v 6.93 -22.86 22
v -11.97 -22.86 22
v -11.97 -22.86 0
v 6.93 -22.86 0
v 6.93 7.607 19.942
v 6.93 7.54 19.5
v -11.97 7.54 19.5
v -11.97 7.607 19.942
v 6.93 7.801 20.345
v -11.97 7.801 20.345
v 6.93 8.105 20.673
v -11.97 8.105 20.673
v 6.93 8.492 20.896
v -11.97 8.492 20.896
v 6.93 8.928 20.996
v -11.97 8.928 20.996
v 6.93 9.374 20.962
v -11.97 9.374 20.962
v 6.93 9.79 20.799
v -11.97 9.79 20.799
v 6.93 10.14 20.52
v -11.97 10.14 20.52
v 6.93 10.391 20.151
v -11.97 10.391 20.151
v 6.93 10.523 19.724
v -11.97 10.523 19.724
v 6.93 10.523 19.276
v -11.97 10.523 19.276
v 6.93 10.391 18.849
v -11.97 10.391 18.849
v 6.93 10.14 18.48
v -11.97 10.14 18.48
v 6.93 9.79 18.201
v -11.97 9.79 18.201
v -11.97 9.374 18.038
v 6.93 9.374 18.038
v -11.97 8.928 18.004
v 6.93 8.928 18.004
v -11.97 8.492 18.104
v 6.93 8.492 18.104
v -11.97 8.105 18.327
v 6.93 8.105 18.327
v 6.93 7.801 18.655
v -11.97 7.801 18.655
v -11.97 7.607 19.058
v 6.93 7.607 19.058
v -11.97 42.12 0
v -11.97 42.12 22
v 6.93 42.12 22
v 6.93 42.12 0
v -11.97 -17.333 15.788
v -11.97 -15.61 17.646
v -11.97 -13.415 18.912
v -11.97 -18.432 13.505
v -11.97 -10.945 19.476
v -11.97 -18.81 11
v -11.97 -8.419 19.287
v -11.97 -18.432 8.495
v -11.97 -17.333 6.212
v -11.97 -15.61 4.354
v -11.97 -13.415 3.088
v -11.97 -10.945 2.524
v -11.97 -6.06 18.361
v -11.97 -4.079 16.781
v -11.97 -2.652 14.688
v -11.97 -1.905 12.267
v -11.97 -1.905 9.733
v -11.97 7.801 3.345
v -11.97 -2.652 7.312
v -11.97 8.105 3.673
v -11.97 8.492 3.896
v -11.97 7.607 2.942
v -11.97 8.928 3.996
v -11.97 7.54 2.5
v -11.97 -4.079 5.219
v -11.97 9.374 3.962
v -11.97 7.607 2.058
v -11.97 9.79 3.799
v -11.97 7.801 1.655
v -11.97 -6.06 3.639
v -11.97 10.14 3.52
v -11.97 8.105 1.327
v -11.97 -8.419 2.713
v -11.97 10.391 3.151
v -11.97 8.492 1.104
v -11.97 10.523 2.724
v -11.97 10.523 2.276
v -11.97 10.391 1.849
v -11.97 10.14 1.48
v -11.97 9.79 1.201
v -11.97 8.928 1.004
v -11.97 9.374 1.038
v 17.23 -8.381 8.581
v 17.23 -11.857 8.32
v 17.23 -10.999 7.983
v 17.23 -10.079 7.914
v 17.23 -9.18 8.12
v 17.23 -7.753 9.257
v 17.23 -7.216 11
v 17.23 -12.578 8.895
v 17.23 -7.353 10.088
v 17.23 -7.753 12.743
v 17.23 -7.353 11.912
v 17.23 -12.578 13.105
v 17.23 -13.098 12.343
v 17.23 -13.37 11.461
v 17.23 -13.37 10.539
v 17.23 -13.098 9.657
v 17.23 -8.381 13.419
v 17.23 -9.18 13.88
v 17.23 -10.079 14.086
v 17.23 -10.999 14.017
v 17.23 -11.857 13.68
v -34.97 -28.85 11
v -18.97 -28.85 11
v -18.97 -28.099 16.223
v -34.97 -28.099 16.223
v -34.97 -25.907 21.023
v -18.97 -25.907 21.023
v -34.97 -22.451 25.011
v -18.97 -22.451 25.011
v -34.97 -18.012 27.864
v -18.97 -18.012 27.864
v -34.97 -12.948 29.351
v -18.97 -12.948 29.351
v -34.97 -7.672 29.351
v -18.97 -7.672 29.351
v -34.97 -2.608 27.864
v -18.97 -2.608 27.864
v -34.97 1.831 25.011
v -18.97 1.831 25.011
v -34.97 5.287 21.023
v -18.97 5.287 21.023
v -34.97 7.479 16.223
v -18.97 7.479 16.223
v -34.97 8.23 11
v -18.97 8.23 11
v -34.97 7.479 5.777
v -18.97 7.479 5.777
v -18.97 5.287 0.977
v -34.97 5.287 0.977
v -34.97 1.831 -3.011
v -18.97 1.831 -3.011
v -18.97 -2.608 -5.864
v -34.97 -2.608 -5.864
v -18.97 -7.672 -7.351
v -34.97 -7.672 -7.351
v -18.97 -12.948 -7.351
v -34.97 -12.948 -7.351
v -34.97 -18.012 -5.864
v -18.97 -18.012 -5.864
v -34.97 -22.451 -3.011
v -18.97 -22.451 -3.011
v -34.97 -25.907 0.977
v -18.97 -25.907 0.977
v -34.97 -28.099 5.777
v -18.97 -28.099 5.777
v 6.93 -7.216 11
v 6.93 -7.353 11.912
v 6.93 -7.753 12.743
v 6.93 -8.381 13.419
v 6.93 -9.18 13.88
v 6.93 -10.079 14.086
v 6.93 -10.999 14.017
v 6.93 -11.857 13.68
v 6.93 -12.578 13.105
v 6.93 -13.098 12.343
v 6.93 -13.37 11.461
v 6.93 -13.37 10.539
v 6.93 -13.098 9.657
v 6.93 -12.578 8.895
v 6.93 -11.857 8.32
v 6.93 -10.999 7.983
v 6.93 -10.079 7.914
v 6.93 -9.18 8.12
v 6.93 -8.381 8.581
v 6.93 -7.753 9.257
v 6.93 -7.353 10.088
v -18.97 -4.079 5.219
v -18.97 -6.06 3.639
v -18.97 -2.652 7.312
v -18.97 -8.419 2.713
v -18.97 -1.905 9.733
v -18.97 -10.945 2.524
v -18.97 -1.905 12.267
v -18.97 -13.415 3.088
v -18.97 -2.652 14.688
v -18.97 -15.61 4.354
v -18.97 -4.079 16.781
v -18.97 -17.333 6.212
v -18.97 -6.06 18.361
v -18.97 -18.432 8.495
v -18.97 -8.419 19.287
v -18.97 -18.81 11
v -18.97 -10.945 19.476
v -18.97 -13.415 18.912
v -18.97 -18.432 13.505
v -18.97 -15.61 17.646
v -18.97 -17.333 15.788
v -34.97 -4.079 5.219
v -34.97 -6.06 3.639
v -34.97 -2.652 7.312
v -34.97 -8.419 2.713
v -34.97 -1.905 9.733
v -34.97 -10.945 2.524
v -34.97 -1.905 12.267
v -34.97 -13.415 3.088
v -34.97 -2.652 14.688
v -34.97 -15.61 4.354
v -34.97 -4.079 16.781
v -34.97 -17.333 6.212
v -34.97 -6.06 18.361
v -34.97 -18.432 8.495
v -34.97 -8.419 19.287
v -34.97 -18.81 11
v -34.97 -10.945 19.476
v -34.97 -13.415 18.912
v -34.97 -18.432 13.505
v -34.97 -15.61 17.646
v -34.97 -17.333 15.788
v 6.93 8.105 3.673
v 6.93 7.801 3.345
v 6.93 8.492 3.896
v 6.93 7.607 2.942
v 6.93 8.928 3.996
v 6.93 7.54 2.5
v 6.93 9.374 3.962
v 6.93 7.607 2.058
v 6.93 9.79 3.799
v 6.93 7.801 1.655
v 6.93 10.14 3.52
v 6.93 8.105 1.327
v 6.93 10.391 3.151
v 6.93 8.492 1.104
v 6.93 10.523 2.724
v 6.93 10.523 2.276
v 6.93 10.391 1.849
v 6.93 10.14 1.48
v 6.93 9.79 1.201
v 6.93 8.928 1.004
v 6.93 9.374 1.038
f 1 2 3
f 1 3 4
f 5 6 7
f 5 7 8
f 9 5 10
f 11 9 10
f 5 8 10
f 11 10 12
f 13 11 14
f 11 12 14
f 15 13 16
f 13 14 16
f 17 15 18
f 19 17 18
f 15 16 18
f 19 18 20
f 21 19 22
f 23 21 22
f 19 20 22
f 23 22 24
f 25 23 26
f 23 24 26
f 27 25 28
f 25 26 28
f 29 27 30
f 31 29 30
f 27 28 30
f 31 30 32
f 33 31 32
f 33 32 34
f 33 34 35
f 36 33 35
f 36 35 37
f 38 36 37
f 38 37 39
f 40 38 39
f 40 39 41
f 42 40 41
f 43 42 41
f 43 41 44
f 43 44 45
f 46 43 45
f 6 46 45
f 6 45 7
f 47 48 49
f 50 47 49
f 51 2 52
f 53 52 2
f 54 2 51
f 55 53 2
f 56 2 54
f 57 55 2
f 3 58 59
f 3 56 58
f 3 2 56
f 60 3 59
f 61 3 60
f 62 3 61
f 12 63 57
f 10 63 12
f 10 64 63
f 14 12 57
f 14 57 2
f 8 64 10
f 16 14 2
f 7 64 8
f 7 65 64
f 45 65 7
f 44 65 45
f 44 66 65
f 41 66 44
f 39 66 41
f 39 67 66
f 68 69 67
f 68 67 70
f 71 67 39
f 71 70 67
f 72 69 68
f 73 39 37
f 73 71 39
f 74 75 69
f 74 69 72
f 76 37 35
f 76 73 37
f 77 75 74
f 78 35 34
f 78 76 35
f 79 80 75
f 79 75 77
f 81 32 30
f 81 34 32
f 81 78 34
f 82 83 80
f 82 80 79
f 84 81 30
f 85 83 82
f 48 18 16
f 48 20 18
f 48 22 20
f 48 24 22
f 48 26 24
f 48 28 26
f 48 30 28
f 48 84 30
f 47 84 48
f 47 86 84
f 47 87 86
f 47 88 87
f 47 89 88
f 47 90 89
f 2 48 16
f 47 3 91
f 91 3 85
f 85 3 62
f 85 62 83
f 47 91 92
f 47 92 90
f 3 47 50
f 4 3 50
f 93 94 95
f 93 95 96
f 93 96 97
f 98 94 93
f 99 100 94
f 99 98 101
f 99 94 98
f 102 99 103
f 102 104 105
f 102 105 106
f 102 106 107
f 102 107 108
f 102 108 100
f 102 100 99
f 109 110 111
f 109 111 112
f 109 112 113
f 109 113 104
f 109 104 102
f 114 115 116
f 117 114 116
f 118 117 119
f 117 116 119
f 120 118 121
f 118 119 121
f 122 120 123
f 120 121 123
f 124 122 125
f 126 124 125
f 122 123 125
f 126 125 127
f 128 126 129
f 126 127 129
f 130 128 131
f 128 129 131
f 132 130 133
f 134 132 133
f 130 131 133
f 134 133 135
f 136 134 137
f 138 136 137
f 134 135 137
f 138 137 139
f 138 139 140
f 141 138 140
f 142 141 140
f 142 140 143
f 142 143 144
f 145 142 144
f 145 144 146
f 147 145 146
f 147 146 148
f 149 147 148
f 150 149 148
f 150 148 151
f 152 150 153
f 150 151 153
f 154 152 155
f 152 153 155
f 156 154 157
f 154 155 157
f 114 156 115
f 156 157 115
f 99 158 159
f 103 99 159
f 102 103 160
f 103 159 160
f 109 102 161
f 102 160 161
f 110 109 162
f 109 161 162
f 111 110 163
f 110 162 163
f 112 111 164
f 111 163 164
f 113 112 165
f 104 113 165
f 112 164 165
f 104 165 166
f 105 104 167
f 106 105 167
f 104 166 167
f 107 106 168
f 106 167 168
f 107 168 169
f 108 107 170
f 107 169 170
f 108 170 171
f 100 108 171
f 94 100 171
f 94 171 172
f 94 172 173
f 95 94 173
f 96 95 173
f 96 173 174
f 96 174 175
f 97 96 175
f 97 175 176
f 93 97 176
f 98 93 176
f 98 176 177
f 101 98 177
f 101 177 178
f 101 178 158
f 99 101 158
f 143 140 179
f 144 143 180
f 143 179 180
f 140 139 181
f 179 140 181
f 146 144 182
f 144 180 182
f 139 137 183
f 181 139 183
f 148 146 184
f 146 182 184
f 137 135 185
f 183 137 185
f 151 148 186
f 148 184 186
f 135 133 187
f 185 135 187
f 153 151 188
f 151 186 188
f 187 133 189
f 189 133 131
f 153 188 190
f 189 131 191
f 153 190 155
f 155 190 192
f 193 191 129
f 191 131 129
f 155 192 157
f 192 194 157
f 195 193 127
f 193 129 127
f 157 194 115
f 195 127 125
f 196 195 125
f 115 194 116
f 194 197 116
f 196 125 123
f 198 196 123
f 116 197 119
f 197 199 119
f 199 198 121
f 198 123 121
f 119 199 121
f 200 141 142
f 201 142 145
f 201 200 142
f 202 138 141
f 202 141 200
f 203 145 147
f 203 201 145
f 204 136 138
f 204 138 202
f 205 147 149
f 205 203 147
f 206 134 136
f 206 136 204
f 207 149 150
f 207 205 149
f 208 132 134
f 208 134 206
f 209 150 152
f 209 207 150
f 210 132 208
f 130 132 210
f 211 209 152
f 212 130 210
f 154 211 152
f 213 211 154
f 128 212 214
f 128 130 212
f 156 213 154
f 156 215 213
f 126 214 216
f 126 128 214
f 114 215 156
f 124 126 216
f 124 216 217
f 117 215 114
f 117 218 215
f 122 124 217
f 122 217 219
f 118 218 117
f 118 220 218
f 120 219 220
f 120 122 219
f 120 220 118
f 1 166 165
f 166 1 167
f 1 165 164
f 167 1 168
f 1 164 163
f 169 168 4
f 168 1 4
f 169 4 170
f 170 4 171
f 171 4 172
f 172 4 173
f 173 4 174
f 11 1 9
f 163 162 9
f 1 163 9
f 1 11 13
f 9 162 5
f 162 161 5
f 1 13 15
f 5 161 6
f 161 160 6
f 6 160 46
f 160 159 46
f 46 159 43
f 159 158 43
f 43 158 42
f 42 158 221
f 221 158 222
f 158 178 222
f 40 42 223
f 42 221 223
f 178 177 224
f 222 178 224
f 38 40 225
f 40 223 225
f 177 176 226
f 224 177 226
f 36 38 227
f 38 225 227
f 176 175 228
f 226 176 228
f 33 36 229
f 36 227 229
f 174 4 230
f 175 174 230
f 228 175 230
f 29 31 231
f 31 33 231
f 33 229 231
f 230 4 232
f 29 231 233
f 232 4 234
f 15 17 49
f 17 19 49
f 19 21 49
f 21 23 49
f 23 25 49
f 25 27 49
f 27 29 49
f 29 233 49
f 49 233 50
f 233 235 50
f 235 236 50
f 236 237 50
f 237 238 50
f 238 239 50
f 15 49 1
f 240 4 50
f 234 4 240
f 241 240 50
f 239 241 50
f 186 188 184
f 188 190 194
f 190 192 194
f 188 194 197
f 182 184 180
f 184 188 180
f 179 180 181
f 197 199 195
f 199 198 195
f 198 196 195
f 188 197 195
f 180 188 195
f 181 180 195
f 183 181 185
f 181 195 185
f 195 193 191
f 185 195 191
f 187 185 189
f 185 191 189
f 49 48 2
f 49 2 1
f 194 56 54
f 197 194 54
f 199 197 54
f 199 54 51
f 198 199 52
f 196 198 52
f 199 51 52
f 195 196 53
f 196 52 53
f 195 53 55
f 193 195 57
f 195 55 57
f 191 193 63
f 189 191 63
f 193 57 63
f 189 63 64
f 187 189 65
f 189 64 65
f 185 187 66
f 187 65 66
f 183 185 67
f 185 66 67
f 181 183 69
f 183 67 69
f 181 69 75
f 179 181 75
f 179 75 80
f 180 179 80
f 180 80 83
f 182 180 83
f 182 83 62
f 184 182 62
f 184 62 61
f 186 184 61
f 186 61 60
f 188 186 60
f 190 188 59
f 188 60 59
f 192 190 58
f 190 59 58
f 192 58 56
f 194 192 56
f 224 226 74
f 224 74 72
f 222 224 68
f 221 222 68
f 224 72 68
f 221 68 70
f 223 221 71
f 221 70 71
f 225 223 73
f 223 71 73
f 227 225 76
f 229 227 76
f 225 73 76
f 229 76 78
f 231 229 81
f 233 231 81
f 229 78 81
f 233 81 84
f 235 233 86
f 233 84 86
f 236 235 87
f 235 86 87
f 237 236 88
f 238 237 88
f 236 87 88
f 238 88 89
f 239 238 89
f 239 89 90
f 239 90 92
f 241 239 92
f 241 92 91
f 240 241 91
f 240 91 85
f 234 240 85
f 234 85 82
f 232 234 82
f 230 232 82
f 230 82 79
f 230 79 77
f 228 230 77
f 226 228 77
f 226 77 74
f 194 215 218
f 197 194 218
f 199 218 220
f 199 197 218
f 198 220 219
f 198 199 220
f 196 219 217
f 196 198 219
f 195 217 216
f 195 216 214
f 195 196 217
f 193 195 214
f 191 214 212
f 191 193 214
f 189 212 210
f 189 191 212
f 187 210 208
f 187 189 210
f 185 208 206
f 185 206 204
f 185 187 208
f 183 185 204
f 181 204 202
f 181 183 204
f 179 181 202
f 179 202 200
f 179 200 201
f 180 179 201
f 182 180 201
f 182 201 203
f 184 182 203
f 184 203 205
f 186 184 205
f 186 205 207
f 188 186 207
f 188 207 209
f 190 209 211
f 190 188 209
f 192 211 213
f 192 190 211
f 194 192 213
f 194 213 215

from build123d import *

# Parameters (mm, degrees)
F0_W     = 18.9000009559
F0_H     = 64.9800021201
F1_DEPTH = 22
F2_R     = 8.5
F3_DEPTH = 7
F4_R     = 18.539660173
F4_R_2   = 8.5
F5_DEPTH = 16
F6_R     = 3.0942257766
F7_DEPTH = 36.2
F9_D     = 3


with BuildPart() as f1:
    # F0 (on Top) → F1 (new body)
    with BuildSketch(Plane.XY):
        with Locations((-2.5199998636, 9.6300011501)):
            Rectangle(F0_W, F0_H)
    extrude(amount=F1_DEPTH)

    # F2 (on face) → F3 (join)
    with BuildSketch(Plane(origin=(-11.9700003415, 0, 0), x_dir=(0, -1, 0), z_dir=(-1, 0, 0))):
        with Locations((10.3100002706, 11)):
            Circle(F2_R)
    extrude(amount=F3_DEPTH)

    # F6 (on face) → F7 (join)
    with BuildSketch(Plane.YZ.offset(-18.9700003415)):
        with Locations((-10.3100002706, 11)):
            Circle(F6_R)
    extrude(amount=F7_DEPTH)

    # F9 (through all)
    with Locations(Plane.YZ.offset(6.9300006144)):
        with Locations((9.04000009, 2.5), (9.04000009, 19.5)):
            Hole(F9_D / 2)


with BuildPart() as f5:
    # F4 (on face) → F5 (new body)
    with BuildSketch(Plane(origin=(-18.9700003415, 0, 0), x_dir=(0, -1, 0), z_dir=(-1, 0, 0))):
        with Locations((10.3100002706, 11)):
            Circle(F4_R)
        with Locations((10.3100002706, 11)):
            Circle(F4_R_2, mode=Mode.SUBTRACT)
    extrude(amount=F5_DEPTH)


solid = Compound([f1.part, f5.part])
